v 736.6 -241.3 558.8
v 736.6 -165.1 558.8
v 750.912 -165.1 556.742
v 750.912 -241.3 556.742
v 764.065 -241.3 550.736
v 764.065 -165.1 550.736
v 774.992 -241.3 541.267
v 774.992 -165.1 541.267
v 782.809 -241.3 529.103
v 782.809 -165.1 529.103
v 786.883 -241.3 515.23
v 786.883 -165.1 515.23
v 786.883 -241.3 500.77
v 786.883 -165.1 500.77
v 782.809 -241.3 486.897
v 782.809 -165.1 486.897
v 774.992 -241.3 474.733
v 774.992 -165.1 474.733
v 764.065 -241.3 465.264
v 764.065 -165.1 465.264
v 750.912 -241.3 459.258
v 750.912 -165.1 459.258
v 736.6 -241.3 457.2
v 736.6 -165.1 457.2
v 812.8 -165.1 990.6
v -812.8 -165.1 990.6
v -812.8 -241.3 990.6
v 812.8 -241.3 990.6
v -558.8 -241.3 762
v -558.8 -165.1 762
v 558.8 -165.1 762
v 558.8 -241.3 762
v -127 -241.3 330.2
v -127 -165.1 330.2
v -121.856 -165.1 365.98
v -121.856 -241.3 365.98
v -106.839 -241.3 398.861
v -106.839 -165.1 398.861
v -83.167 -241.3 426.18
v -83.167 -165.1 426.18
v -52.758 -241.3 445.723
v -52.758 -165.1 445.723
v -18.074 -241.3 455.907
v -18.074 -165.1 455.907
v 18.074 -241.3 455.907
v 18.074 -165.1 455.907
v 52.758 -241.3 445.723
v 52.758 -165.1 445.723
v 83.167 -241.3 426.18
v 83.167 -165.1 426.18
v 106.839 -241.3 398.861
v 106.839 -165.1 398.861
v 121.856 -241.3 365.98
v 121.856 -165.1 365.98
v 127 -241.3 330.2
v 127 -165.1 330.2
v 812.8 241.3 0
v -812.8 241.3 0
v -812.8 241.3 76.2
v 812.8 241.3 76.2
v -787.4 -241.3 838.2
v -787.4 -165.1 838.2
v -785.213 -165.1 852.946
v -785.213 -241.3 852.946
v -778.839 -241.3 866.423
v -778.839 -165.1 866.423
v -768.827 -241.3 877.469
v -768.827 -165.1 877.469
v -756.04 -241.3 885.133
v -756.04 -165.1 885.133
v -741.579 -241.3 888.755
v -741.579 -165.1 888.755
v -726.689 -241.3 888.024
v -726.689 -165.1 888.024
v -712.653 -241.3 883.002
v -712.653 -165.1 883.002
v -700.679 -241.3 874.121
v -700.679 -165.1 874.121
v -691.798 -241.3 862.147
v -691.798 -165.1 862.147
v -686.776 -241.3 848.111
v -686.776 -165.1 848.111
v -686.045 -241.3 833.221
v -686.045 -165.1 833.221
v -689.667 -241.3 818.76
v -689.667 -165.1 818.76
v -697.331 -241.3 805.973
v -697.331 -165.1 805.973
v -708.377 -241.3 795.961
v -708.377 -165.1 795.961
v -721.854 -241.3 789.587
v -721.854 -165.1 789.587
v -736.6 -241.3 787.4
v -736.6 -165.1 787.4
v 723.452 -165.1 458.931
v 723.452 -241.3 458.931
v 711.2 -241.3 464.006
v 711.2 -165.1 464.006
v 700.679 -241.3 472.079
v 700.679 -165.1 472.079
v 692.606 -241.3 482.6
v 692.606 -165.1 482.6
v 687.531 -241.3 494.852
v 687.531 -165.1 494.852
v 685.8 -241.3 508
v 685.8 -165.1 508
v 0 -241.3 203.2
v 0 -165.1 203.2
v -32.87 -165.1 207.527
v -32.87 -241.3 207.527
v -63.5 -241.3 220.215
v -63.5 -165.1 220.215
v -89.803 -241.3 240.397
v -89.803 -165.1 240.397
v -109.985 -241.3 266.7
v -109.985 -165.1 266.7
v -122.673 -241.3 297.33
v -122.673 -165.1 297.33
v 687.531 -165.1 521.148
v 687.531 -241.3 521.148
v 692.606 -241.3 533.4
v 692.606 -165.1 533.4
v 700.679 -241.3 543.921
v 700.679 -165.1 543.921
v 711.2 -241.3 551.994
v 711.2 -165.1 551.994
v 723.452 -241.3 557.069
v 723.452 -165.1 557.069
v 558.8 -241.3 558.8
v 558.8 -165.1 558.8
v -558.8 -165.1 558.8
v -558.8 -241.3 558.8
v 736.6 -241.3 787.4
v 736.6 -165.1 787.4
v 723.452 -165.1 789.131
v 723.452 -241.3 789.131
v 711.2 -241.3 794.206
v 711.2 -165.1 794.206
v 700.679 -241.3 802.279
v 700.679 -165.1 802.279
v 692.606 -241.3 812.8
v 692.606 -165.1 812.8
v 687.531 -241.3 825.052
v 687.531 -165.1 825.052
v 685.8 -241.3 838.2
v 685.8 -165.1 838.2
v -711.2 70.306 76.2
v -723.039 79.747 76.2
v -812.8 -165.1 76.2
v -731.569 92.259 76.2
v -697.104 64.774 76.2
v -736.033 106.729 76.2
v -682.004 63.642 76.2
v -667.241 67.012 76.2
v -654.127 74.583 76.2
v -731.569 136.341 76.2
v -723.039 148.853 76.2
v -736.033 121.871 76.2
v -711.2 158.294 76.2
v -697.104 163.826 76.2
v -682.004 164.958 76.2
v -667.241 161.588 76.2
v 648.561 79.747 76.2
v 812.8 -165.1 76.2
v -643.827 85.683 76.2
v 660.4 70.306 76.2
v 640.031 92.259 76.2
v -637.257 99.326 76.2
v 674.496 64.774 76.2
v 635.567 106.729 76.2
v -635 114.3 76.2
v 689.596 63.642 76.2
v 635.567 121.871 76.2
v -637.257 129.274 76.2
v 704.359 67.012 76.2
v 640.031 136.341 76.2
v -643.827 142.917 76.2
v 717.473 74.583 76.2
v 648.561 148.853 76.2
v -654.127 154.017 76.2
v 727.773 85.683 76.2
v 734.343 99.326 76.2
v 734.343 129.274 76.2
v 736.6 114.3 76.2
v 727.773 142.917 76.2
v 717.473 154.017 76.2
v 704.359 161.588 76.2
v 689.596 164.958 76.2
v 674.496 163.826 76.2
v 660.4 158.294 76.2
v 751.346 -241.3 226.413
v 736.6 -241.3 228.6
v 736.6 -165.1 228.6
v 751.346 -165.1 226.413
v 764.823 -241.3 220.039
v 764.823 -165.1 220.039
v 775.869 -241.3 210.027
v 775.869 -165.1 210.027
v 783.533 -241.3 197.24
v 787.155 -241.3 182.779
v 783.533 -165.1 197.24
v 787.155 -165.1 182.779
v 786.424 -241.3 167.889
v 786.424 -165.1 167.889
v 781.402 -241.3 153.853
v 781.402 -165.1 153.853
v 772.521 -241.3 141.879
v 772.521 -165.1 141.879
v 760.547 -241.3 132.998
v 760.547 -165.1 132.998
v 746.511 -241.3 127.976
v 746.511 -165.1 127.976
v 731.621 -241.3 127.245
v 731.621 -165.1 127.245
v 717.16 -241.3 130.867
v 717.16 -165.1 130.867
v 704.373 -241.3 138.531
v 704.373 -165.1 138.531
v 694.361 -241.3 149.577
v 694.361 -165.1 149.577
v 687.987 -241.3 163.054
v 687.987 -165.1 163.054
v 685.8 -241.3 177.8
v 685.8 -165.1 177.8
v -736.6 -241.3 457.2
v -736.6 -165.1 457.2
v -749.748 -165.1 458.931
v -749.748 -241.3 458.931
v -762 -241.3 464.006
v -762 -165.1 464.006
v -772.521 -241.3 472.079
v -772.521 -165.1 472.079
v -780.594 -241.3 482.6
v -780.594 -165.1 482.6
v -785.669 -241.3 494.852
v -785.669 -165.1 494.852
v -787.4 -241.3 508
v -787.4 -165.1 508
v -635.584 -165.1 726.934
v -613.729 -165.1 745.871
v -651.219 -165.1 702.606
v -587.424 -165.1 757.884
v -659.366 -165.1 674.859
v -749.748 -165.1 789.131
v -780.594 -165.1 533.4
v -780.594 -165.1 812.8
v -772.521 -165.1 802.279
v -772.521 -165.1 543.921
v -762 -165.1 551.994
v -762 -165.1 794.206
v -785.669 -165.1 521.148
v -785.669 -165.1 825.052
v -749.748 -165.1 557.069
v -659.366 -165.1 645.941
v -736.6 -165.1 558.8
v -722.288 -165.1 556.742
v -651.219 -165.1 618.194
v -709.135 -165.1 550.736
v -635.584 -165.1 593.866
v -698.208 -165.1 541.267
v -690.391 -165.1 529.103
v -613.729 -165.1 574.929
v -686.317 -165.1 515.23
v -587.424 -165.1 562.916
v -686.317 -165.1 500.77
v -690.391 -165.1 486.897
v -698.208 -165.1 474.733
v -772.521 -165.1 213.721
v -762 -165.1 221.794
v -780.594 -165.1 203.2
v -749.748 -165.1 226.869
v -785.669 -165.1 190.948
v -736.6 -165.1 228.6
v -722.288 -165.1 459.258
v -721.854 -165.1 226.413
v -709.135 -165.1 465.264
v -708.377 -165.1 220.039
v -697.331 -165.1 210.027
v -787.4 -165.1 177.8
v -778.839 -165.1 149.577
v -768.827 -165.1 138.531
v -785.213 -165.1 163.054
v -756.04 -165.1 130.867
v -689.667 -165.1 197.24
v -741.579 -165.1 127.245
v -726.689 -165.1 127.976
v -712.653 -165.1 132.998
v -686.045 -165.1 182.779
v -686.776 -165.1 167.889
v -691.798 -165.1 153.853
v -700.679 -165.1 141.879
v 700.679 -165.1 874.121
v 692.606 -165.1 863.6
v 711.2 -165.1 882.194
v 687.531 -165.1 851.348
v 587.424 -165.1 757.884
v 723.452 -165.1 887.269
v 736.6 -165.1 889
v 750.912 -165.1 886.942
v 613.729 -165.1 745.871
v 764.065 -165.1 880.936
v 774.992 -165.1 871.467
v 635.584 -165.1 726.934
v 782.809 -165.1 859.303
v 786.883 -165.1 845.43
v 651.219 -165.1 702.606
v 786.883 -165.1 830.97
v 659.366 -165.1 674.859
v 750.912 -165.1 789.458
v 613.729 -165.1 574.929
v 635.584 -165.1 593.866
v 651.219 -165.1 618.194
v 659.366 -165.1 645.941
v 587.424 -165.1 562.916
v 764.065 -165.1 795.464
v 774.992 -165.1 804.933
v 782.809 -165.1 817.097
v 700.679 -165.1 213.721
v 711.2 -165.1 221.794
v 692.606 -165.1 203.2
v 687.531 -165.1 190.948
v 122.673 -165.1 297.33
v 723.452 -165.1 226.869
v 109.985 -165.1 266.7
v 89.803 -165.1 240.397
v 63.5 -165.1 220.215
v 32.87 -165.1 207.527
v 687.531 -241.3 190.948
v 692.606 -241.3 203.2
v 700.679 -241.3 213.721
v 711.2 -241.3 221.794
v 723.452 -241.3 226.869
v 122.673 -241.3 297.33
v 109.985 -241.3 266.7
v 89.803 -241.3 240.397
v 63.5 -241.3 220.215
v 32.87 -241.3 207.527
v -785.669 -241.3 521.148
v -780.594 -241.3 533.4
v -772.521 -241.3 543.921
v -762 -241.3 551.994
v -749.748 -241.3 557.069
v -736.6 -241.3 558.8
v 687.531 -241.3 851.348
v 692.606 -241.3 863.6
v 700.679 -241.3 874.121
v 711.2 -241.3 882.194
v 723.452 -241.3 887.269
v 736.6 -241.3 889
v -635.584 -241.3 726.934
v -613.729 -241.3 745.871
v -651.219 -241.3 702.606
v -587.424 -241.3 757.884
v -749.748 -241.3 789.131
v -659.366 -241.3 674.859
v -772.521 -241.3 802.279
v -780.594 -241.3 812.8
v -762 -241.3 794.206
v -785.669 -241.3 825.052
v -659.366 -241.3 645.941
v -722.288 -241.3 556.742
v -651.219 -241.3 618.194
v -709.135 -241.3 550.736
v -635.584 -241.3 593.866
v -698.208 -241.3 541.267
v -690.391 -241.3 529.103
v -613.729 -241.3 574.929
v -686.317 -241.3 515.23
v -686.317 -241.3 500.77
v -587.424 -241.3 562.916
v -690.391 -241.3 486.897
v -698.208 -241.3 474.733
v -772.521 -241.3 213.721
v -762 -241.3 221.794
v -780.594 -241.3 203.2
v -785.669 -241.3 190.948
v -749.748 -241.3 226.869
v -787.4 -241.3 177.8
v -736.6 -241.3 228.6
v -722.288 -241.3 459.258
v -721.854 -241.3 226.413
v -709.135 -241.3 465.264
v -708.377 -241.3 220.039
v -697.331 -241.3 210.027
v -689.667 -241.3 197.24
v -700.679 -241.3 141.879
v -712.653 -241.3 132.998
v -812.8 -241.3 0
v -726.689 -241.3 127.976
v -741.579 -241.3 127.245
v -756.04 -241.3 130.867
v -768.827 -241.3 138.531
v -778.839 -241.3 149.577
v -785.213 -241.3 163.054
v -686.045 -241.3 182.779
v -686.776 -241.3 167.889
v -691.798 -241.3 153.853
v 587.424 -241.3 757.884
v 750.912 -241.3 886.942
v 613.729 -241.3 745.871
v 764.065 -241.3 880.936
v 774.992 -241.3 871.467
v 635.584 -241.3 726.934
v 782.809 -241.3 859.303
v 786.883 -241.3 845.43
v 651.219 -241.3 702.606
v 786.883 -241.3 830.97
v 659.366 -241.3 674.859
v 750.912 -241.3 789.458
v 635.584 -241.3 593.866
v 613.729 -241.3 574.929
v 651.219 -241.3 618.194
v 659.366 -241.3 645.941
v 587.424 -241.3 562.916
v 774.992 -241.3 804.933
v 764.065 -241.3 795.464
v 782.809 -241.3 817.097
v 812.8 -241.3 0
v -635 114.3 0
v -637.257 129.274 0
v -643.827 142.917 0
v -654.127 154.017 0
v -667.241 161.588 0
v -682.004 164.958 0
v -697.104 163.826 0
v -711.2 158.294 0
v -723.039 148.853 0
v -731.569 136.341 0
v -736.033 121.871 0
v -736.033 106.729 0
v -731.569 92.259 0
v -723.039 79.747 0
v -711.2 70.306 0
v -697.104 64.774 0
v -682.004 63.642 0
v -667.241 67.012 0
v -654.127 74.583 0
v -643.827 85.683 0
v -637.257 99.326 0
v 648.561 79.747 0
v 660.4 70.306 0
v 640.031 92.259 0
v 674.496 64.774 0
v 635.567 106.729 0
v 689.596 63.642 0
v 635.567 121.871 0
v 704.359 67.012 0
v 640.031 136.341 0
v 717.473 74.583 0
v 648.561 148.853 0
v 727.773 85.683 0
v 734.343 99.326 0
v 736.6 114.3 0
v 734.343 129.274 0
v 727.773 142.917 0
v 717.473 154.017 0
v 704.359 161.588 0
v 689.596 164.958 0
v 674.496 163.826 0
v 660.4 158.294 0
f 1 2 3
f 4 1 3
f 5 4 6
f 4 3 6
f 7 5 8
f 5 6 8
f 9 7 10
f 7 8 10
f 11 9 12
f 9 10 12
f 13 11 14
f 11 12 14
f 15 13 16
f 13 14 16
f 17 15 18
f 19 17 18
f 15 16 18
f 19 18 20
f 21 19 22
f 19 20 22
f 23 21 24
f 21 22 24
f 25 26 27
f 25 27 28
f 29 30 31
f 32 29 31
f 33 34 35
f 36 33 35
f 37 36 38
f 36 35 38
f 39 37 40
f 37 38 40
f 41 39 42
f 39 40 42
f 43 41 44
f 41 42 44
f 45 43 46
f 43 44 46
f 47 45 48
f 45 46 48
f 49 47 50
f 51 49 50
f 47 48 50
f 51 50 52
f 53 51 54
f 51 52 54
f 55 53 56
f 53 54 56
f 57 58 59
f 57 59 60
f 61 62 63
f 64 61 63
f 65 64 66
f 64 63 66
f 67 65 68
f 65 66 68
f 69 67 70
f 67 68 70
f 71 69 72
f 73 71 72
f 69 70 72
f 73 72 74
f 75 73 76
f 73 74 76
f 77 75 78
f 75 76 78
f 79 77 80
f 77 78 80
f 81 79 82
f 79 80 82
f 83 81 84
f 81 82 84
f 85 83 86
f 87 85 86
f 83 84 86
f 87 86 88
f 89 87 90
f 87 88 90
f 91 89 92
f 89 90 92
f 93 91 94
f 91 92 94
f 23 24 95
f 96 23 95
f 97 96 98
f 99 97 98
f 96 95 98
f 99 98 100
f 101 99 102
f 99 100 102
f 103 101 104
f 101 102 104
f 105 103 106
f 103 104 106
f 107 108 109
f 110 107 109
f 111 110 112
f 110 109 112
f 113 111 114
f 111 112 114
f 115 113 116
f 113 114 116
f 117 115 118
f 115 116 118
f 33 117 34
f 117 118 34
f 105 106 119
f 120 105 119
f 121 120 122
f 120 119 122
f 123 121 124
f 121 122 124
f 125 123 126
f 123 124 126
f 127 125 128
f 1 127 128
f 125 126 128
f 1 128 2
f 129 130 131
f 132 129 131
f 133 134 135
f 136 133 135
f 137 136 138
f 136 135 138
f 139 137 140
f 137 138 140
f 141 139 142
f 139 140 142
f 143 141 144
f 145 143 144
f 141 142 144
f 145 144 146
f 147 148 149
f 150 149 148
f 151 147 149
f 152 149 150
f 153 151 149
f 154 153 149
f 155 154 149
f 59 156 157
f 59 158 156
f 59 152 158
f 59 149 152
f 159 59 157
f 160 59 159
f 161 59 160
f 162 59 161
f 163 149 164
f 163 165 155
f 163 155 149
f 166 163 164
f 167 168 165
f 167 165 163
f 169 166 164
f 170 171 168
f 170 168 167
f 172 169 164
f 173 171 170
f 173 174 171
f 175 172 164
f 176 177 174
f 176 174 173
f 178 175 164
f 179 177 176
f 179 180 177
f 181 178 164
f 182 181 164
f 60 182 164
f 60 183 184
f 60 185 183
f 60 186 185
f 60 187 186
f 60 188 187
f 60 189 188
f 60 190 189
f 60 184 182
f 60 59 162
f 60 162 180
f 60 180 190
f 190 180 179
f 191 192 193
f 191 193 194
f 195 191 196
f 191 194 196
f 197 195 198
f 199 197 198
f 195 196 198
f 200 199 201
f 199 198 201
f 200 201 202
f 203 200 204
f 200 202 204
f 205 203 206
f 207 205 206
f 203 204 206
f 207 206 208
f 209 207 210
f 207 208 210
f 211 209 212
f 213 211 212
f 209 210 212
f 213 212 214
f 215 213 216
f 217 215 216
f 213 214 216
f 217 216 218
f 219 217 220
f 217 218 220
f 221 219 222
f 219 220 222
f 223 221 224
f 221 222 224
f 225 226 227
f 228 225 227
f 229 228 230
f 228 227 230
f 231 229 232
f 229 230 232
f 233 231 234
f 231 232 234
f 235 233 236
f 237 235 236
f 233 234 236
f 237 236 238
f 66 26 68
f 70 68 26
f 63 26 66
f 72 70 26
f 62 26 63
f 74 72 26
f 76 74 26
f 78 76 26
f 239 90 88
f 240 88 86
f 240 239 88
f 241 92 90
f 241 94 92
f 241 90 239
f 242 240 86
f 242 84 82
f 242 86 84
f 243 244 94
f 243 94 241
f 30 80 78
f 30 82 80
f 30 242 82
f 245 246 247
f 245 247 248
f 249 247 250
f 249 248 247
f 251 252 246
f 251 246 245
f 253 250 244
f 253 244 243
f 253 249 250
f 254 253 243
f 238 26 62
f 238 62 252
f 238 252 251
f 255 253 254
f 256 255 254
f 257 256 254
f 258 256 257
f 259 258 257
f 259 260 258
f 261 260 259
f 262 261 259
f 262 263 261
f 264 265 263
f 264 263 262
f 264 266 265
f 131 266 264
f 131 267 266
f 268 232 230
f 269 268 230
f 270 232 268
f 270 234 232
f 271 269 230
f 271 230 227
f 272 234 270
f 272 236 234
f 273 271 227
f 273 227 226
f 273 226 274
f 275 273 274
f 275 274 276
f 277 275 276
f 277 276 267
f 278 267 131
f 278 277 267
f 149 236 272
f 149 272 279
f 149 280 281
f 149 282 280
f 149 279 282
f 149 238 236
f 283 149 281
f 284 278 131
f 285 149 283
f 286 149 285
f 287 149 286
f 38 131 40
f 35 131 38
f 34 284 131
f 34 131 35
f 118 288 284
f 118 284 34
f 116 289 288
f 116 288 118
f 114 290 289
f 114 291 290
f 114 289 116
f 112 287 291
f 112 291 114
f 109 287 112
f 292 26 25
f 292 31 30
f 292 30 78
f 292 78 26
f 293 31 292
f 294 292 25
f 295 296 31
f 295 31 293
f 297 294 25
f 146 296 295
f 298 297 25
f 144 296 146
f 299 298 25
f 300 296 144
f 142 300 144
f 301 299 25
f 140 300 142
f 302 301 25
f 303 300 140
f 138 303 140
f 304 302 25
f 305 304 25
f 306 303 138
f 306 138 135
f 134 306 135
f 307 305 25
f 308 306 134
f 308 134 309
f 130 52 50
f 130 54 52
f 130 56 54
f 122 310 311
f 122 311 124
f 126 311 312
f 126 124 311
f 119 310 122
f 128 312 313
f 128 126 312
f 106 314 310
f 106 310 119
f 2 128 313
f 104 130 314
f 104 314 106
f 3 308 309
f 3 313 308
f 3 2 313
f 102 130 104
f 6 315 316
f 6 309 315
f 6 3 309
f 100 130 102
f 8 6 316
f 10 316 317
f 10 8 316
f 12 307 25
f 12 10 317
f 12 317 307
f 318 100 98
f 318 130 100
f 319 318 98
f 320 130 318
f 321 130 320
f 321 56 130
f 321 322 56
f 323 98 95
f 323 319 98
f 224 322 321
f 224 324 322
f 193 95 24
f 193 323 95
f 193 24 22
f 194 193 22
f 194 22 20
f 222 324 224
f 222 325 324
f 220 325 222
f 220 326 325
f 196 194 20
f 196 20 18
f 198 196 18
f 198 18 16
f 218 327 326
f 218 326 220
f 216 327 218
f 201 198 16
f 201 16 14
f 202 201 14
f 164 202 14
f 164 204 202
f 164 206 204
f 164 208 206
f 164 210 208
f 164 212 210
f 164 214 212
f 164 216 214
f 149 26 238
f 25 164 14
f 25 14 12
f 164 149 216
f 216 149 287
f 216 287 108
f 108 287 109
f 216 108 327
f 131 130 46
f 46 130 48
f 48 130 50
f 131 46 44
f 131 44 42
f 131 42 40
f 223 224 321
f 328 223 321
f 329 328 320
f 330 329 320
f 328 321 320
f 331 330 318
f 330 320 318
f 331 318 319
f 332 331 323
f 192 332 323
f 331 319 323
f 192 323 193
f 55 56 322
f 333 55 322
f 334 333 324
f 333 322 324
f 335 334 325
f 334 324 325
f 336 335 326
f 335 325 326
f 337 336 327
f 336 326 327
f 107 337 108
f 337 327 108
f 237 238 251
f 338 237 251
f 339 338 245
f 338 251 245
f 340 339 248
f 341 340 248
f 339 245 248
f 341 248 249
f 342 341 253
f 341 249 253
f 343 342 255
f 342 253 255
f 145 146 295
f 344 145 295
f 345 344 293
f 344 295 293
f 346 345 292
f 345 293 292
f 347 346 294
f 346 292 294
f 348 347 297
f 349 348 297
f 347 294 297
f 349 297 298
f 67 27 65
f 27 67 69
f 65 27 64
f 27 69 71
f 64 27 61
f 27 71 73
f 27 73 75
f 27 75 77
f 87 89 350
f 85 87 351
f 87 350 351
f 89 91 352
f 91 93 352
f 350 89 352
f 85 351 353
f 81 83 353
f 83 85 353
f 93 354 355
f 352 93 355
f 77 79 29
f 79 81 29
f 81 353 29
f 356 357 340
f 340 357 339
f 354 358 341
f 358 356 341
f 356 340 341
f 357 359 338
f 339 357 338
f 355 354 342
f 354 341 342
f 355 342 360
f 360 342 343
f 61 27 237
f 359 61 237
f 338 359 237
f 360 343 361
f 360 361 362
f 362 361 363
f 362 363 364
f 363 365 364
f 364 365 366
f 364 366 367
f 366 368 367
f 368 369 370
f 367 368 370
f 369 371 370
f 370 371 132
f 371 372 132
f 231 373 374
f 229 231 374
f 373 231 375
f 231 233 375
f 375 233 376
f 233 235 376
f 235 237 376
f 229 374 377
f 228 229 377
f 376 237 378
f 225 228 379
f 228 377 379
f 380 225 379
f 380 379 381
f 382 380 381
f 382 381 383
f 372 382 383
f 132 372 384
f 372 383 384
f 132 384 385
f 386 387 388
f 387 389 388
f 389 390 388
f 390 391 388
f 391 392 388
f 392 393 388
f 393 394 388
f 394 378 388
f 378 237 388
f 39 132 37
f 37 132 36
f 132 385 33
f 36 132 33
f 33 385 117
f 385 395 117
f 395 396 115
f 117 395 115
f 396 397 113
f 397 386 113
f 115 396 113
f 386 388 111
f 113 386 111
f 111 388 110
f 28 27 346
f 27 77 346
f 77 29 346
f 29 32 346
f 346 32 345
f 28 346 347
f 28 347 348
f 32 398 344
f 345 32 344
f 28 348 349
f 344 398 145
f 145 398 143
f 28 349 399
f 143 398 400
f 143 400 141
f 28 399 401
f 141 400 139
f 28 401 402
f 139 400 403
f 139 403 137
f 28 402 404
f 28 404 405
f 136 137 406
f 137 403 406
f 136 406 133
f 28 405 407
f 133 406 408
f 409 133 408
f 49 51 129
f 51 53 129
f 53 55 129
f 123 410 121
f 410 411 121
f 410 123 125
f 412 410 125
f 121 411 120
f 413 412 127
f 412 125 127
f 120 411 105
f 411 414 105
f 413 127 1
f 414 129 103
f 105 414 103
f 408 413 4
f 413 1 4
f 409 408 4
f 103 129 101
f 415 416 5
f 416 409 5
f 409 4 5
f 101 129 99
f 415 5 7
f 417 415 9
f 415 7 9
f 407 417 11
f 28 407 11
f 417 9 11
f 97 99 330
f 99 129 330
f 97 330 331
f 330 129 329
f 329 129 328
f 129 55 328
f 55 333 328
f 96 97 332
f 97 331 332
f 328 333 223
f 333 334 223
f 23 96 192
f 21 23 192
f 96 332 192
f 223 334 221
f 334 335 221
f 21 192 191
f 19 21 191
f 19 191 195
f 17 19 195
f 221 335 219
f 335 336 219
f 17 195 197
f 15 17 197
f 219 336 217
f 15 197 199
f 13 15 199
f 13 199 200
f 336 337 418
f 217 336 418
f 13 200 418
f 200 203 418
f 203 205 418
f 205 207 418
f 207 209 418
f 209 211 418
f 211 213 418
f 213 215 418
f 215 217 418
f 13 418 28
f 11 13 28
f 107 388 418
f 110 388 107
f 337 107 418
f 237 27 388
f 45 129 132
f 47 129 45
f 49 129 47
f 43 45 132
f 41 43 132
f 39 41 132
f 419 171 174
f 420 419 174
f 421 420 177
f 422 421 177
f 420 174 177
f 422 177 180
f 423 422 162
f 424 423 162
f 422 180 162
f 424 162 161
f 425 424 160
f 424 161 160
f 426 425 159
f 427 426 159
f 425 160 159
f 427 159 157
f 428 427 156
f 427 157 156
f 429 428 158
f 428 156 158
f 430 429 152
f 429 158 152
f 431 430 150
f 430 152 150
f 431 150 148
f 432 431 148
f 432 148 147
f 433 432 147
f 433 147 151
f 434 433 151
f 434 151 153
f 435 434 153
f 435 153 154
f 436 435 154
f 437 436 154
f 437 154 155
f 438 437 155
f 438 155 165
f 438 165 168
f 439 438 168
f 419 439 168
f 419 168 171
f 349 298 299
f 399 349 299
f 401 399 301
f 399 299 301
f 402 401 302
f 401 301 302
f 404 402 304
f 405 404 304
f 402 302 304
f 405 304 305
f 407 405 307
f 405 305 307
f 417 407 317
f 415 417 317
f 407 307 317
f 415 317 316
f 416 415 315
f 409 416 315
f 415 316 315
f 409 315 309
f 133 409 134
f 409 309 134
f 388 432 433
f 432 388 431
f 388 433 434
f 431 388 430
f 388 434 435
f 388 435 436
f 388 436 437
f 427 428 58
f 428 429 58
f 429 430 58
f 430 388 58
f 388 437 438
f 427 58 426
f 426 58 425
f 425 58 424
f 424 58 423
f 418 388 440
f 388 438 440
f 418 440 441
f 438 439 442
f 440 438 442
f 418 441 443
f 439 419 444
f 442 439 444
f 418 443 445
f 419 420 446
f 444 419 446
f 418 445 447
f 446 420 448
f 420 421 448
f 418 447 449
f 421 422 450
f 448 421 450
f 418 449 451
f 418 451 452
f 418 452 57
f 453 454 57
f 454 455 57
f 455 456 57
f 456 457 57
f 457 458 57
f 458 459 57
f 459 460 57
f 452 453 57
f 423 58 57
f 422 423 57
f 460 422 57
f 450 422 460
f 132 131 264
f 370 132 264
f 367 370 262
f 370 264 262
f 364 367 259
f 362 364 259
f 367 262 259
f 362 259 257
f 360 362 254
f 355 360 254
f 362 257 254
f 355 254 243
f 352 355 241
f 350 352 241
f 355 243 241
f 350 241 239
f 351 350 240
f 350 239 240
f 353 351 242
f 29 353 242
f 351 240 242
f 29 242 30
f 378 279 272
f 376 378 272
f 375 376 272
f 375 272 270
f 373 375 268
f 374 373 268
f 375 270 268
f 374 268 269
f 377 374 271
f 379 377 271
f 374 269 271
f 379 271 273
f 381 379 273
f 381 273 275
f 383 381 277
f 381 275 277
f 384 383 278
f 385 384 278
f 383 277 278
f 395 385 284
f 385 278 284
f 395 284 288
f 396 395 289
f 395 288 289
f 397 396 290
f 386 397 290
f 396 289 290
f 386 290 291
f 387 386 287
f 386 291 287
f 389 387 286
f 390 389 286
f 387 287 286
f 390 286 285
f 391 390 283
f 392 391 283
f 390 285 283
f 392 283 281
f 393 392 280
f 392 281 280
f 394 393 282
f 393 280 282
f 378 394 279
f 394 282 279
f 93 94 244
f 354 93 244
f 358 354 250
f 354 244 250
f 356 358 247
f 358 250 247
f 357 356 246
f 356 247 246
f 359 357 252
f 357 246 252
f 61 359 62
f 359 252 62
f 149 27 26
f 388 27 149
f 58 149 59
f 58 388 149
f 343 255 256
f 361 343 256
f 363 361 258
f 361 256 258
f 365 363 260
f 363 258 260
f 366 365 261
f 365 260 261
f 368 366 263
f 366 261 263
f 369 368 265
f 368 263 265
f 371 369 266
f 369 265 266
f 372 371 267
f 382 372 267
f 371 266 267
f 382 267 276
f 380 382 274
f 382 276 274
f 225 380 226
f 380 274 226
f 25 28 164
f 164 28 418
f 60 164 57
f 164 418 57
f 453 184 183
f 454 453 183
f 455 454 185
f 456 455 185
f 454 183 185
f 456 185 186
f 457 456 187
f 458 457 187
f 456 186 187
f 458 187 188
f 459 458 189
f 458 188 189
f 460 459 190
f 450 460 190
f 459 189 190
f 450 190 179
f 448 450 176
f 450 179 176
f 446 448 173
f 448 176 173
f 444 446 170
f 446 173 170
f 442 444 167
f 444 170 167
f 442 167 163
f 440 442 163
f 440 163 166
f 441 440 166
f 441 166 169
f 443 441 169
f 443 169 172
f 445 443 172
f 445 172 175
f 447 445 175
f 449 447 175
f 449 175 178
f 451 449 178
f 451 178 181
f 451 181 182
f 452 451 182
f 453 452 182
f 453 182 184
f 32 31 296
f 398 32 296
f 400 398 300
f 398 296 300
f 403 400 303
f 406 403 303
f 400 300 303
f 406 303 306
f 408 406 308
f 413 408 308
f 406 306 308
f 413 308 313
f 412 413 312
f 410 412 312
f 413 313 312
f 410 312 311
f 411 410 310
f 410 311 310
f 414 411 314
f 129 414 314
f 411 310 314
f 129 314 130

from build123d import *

# Parameters (mm, degrees)
F0_W     = 1625.6
F0_H     = 482.6
F1_DEPTH = 76.2
F2_W     = 1625.6
F2_H     = 76.2
F3_DEPTH = 914.4
F5_DEPTH = 612.14
F7_DEPTH = 281.94
F8_R     = 50.8
F9_DEPTH = 215.9


with BuildPart() as f1:
    # F0 (on Top) → F1 (new body)
    with BuildSketch(Plane.XY):
        Rectangle(F0_W, F0_H)
    extrude(amount=F1_DEPTH)

    # F2 (on face) → F3 (join)
    with BuildSketch(Plane.XY.offset(76.2)):
        with Locations((0, -203.2)):
            Rectangle(F2_W, F2_H)
    extrude(amount=F3_DEPTH)

    # F4 (on face) → F5 (cut)
    with BuildSketch(Plane(origin=(0, -165.1, 0), x_dir=(-1, 0, 0), z_dir=(0, 1, 0))):
        with BuildLine():
            ThreePointArc((-127, 330.2), (-89.802561, 240.397439), (0, 203.2))
            Line((0, 203.2), (0, 330.2))
            Line((0, 330.2), (-127, 330.2))
        make_face()
        with BuildLine():
            Line((0, 330.2), (0, 203.2))
            ThreePointArc((0, 203.2), (89.802561, 240.397439), (127, 330.2))
            ThreePointArc((127, 330.2), (0, 457.2), (-127, 330.2))
            Line((-127, 330.2), (0, 330.2))
        make_face()
        with BuildLine():
            Line((558.8, 762), (-558.8, 762))
            ThreePointArc((-558.8, 762), (-660.4, 660.4), (-558.8, 558.8))
            Line((-558.8, 558.8), (558.8, 558.8))
            ThreePointArc((558.8, 558.8), (660.4, 660.4), (558.8, 762))
        make_face()
    extrude(amount=-F5_DEPTH, mode=Mode.SUBTRACT)

    # F6 (on face) → F7 (cut)
    with BuildSketch(Plane(origin=(0, -165.1, 0), x_dir=(-1, 0, 0), z_dir=(0, 1, 0))):
        with BuildLine():
            ThreePointArc((736.6, 787.4), (772.521024, 802.278976), (787.4, 838.2))
            Line((787.4, 838.2), (736.6, 838.2))
            Line((736.6, 838.2), (736.6, 787.4))
        make_face()
        with BuildLine():
            Line((736.6, 838.2), (787.4, 838.2))
            ThreePointArc((787.4, 838.2), (700.678976, 874.121024), (736.6, 787.4))
            Line((736.6, 787.4), (736.6, 838.2))
        make_face()
        with BuildLine():
            ThreePointArc((787.4, 177.8), (772.521024, 213.721024), (736.6, 228.6))
            ThreePointArc((736.6, 228.6), (700.678976, 141.878976), (787.4, 177.8))
        make_face()
        with BuildLine():
            ThreePointArc((787.4, 508), (772.521024, 543.921024), (736.6, 558.8))
            Line((736.6, 558.8), (736.6, 508))
            Line((736.6, 508), (736.6, 457.2))
            ThreePointArc((736.6, 457.2), (772.521024, 472.078976), (787.4, 508))
        make_face()
        with BuildLine():
            Line((736.6, 508), (736.6, 558.8))
            ThreePointArc((736.6, 558.8), (685.8, 508), (736.6, 457.2))
            Line((736.6, 457.2), (736.6, 508))
        make_face()
        with BuildLine():
            ThreePointArc((-685.8, 838.2), (-700.678976, 874.121024), (-736.6, 889))
            Line((-736.6, 889), (-736.6, 838.2))
            Line((-736.6, 838.2), (-736.6, 787.4))
            ThreePointArc((-736.6, 787.4), (-700.678976, 802.278976), (-685.8, 838.2))
        make_face()
        with BuildLine():
            ThreePointArc((-685.8, 177.8), (-700.678976, 213.721024), (-736.6, 228.6))
            ThreePointArc((-736.6, 228.6), (-772.521024, 141.878976), (-685.8, 177.8))
        make_face()
        with BuildLine():
            ThreePointArc((-685.8, 508), (-700.678976, 543.921024), (-736.6, 558.8))
            Line((-736.6, 558.8), (-736.6, 508))
            Line((-736.6, 508), (-736.6, 457.2))
            ThreePointArc((-736.6, 457.2), (-700.678976, 472.078976), (-685.8, 508))
        make_face()
        with BuildLine():
            Line((-736.6, 508), (-736.6, 558.8))
            ThreePointArc((-736.6, 558.8), (-787.4, 508), (-736.6, 457.2))
            Line((-736.6, 457.2), (-736.6, 508))
        make_face()
        with BuildLine():
            Line((-736.6, 838.2), (-736.6, 889))
            ThreePointArc((-736.6, 889), (-787.4, 838.2), (-736.6, 787.4))
            Line((-736.6, 787.4), (-736.6, 838.2))
        make_face()
    extrude(amount=-F7_DEPTH, mode=Mode.SUBTRACT)

    # F8 (on face) → F9 (cut)
    with BuildSketch(Plane.XY.offset(76.2)):
        with Locations((-685.8, 114.3)):
            Circle(F8_R)
        with Locations((685.8, 114.3)):
            Circle(F8_R)
    extrude(amount=-F9_DEPTH, mode=Mode.SUBTRACT)


solid = f1.part
